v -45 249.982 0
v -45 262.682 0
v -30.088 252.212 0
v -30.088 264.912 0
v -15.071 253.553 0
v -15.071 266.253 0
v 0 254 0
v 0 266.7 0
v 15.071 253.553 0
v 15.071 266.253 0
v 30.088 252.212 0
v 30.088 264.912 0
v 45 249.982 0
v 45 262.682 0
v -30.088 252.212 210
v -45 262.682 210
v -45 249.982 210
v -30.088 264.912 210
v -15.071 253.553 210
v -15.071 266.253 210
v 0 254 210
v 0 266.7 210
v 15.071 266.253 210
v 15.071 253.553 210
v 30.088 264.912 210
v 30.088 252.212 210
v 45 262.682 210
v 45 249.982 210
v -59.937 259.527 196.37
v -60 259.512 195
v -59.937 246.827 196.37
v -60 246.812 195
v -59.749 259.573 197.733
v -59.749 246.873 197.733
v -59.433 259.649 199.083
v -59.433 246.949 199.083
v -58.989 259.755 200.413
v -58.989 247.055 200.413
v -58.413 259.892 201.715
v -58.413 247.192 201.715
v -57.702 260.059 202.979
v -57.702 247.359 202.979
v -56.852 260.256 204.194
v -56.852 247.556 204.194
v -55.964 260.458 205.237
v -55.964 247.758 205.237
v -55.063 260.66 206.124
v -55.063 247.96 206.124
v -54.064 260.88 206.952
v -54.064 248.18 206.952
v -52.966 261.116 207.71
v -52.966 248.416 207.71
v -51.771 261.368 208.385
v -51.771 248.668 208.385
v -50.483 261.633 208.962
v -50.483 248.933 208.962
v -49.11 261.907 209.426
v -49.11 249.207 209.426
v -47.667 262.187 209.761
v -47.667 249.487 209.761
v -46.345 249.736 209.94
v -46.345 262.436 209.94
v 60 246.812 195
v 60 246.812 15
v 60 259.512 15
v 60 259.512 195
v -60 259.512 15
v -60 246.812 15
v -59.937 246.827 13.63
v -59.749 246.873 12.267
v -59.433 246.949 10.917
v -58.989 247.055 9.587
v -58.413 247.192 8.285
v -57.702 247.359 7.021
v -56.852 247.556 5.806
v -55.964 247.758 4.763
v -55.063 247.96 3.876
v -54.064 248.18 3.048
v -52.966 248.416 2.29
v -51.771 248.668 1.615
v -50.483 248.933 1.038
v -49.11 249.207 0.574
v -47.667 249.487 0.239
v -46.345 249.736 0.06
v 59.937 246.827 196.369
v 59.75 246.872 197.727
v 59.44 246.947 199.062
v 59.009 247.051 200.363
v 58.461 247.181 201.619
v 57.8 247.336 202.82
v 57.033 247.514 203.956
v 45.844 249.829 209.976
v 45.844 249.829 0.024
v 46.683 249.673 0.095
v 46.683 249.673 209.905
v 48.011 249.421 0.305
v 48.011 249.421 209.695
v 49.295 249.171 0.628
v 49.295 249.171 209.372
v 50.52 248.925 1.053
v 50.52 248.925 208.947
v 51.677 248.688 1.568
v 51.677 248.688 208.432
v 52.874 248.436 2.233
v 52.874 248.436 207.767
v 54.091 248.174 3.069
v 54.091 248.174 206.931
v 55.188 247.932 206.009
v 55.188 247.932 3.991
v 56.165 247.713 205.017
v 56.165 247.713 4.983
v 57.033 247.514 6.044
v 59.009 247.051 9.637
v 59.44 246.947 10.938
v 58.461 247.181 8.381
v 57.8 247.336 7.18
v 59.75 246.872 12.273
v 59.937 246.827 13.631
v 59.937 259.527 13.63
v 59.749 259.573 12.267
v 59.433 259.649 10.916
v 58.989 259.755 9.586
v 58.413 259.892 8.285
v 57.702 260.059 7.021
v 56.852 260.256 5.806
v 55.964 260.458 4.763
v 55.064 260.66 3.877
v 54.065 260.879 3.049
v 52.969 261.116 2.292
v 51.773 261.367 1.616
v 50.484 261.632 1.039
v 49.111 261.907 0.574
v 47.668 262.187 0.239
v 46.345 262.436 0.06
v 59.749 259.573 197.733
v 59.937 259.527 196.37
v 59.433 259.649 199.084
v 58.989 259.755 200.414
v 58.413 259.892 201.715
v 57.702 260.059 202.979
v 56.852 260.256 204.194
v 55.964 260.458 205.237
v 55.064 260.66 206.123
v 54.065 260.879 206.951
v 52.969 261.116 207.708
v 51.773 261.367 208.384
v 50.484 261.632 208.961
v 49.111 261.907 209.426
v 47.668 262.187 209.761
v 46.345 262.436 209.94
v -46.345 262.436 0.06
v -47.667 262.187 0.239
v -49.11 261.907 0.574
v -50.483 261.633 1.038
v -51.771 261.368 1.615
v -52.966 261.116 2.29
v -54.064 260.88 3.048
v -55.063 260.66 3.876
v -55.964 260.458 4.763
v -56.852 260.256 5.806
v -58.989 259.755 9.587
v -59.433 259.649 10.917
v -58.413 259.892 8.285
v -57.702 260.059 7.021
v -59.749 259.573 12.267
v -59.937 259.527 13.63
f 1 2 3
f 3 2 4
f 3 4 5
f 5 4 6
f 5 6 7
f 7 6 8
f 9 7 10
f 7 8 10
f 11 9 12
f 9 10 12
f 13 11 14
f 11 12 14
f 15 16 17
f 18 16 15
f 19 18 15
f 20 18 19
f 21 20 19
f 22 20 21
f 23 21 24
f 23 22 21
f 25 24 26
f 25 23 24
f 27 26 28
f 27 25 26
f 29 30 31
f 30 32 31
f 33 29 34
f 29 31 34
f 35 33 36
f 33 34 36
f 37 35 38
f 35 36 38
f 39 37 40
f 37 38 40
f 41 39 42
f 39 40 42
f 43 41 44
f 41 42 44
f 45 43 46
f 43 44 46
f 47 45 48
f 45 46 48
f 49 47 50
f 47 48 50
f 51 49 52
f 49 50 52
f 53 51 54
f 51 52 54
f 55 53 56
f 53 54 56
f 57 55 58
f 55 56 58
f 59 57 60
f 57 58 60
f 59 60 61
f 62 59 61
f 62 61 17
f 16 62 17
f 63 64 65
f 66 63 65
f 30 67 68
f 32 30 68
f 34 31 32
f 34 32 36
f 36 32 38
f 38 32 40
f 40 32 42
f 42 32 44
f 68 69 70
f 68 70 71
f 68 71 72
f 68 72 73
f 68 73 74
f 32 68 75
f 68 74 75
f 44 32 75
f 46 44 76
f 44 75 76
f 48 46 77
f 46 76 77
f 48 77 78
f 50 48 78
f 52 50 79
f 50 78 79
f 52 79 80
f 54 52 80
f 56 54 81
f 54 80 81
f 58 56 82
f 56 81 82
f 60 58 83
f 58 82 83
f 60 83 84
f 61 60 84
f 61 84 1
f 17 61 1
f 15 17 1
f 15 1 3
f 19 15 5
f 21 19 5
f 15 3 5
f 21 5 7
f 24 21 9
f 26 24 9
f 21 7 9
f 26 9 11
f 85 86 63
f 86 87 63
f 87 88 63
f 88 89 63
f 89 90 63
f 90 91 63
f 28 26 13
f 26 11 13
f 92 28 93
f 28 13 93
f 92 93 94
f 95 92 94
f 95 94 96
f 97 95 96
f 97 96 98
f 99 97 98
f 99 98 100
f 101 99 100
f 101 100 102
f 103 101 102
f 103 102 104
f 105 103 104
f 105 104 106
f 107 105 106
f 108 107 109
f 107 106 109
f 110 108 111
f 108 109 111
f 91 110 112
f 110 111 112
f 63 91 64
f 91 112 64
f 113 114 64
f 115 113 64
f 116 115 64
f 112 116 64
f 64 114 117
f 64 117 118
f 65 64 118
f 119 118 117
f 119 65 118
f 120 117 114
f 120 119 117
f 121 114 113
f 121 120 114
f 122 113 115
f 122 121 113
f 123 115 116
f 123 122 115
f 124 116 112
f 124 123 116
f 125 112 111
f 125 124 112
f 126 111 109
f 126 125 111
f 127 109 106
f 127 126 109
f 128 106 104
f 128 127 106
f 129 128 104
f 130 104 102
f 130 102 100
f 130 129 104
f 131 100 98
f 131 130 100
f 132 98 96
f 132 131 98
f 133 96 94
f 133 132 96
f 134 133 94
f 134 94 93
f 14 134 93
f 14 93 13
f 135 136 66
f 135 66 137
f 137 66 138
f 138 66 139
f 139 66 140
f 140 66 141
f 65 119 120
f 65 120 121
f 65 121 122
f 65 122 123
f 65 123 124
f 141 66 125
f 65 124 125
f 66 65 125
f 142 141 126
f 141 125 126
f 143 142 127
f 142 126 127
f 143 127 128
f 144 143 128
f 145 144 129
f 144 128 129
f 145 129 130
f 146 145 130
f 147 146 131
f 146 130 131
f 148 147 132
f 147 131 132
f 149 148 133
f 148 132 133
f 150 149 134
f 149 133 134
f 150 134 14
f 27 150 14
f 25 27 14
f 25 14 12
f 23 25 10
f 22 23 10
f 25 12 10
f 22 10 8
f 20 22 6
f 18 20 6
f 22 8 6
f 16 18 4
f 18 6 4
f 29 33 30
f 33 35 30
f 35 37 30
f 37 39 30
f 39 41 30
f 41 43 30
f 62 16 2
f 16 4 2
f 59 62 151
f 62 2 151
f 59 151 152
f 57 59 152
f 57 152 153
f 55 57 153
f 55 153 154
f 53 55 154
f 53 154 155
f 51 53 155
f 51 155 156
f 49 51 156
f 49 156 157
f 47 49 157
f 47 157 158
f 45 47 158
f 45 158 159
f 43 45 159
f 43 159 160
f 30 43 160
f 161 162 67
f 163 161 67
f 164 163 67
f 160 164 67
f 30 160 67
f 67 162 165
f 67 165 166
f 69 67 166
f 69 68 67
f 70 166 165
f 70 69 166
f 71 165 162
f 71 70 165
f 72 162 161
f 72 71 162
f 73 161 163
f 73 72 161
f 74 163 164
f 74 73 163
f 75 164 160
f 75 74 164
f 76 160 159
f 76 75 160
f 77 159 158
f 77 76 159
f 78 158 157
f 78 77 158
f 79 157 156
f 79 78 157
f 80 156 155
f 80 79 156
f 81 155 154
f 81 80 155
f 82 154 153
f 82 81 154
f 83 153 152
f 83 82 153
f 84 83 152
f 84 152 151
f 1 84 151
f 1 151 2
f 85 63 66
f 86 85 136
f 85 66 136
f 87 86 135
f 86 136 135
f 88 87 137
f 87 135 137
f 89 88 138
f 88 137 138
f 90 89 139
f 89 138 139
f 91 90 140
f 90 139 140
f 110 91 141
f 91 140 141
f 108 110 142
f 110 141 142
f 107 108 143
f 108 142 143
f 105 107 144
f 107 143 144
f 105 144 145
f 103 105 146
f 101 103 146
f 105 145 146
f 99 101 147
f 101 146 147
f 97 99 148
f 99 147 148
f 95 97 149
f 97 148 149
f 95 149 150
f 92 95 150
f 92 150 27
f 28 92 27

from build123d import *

# Parameters (mm, degrees)
BOSS_EXTRUDE1_DEPTH = 210
FILLET2_R           = 15


with BuildPart() as part:
    # Sketch1 → Boss-Extrude1 (new body)
    with BuildSketch(Plane.XY):
        with BuildLine():
            Line((-60, 259.511669092), (-60, 246.811669092))
            ThreePointArc((-60, 246.811669092), (0, 254), (60, 246.811669092))
            Line((60, 246.811669092), (60, 259.511669092))
            ThreePointArc((60, 259.511669092), (0, 266.7), (-60, 259.511669092))
        make_face()
    extrude(amount=BOSS_EXTRUDE1_DEPTH)

    # Fillet2
    fillet2_edges = [part.edges().sort_by_distance(p)[0] for p in [
        (60, 253.161669092, 210),
        (60, 253.161669092, 0),
        (-60, 253.161669092, 0),
        (-60, 253.161669092, 210),
    ]]
    fillet(fillet2_edges, radius=FILLET2_R)


solid = part.part
